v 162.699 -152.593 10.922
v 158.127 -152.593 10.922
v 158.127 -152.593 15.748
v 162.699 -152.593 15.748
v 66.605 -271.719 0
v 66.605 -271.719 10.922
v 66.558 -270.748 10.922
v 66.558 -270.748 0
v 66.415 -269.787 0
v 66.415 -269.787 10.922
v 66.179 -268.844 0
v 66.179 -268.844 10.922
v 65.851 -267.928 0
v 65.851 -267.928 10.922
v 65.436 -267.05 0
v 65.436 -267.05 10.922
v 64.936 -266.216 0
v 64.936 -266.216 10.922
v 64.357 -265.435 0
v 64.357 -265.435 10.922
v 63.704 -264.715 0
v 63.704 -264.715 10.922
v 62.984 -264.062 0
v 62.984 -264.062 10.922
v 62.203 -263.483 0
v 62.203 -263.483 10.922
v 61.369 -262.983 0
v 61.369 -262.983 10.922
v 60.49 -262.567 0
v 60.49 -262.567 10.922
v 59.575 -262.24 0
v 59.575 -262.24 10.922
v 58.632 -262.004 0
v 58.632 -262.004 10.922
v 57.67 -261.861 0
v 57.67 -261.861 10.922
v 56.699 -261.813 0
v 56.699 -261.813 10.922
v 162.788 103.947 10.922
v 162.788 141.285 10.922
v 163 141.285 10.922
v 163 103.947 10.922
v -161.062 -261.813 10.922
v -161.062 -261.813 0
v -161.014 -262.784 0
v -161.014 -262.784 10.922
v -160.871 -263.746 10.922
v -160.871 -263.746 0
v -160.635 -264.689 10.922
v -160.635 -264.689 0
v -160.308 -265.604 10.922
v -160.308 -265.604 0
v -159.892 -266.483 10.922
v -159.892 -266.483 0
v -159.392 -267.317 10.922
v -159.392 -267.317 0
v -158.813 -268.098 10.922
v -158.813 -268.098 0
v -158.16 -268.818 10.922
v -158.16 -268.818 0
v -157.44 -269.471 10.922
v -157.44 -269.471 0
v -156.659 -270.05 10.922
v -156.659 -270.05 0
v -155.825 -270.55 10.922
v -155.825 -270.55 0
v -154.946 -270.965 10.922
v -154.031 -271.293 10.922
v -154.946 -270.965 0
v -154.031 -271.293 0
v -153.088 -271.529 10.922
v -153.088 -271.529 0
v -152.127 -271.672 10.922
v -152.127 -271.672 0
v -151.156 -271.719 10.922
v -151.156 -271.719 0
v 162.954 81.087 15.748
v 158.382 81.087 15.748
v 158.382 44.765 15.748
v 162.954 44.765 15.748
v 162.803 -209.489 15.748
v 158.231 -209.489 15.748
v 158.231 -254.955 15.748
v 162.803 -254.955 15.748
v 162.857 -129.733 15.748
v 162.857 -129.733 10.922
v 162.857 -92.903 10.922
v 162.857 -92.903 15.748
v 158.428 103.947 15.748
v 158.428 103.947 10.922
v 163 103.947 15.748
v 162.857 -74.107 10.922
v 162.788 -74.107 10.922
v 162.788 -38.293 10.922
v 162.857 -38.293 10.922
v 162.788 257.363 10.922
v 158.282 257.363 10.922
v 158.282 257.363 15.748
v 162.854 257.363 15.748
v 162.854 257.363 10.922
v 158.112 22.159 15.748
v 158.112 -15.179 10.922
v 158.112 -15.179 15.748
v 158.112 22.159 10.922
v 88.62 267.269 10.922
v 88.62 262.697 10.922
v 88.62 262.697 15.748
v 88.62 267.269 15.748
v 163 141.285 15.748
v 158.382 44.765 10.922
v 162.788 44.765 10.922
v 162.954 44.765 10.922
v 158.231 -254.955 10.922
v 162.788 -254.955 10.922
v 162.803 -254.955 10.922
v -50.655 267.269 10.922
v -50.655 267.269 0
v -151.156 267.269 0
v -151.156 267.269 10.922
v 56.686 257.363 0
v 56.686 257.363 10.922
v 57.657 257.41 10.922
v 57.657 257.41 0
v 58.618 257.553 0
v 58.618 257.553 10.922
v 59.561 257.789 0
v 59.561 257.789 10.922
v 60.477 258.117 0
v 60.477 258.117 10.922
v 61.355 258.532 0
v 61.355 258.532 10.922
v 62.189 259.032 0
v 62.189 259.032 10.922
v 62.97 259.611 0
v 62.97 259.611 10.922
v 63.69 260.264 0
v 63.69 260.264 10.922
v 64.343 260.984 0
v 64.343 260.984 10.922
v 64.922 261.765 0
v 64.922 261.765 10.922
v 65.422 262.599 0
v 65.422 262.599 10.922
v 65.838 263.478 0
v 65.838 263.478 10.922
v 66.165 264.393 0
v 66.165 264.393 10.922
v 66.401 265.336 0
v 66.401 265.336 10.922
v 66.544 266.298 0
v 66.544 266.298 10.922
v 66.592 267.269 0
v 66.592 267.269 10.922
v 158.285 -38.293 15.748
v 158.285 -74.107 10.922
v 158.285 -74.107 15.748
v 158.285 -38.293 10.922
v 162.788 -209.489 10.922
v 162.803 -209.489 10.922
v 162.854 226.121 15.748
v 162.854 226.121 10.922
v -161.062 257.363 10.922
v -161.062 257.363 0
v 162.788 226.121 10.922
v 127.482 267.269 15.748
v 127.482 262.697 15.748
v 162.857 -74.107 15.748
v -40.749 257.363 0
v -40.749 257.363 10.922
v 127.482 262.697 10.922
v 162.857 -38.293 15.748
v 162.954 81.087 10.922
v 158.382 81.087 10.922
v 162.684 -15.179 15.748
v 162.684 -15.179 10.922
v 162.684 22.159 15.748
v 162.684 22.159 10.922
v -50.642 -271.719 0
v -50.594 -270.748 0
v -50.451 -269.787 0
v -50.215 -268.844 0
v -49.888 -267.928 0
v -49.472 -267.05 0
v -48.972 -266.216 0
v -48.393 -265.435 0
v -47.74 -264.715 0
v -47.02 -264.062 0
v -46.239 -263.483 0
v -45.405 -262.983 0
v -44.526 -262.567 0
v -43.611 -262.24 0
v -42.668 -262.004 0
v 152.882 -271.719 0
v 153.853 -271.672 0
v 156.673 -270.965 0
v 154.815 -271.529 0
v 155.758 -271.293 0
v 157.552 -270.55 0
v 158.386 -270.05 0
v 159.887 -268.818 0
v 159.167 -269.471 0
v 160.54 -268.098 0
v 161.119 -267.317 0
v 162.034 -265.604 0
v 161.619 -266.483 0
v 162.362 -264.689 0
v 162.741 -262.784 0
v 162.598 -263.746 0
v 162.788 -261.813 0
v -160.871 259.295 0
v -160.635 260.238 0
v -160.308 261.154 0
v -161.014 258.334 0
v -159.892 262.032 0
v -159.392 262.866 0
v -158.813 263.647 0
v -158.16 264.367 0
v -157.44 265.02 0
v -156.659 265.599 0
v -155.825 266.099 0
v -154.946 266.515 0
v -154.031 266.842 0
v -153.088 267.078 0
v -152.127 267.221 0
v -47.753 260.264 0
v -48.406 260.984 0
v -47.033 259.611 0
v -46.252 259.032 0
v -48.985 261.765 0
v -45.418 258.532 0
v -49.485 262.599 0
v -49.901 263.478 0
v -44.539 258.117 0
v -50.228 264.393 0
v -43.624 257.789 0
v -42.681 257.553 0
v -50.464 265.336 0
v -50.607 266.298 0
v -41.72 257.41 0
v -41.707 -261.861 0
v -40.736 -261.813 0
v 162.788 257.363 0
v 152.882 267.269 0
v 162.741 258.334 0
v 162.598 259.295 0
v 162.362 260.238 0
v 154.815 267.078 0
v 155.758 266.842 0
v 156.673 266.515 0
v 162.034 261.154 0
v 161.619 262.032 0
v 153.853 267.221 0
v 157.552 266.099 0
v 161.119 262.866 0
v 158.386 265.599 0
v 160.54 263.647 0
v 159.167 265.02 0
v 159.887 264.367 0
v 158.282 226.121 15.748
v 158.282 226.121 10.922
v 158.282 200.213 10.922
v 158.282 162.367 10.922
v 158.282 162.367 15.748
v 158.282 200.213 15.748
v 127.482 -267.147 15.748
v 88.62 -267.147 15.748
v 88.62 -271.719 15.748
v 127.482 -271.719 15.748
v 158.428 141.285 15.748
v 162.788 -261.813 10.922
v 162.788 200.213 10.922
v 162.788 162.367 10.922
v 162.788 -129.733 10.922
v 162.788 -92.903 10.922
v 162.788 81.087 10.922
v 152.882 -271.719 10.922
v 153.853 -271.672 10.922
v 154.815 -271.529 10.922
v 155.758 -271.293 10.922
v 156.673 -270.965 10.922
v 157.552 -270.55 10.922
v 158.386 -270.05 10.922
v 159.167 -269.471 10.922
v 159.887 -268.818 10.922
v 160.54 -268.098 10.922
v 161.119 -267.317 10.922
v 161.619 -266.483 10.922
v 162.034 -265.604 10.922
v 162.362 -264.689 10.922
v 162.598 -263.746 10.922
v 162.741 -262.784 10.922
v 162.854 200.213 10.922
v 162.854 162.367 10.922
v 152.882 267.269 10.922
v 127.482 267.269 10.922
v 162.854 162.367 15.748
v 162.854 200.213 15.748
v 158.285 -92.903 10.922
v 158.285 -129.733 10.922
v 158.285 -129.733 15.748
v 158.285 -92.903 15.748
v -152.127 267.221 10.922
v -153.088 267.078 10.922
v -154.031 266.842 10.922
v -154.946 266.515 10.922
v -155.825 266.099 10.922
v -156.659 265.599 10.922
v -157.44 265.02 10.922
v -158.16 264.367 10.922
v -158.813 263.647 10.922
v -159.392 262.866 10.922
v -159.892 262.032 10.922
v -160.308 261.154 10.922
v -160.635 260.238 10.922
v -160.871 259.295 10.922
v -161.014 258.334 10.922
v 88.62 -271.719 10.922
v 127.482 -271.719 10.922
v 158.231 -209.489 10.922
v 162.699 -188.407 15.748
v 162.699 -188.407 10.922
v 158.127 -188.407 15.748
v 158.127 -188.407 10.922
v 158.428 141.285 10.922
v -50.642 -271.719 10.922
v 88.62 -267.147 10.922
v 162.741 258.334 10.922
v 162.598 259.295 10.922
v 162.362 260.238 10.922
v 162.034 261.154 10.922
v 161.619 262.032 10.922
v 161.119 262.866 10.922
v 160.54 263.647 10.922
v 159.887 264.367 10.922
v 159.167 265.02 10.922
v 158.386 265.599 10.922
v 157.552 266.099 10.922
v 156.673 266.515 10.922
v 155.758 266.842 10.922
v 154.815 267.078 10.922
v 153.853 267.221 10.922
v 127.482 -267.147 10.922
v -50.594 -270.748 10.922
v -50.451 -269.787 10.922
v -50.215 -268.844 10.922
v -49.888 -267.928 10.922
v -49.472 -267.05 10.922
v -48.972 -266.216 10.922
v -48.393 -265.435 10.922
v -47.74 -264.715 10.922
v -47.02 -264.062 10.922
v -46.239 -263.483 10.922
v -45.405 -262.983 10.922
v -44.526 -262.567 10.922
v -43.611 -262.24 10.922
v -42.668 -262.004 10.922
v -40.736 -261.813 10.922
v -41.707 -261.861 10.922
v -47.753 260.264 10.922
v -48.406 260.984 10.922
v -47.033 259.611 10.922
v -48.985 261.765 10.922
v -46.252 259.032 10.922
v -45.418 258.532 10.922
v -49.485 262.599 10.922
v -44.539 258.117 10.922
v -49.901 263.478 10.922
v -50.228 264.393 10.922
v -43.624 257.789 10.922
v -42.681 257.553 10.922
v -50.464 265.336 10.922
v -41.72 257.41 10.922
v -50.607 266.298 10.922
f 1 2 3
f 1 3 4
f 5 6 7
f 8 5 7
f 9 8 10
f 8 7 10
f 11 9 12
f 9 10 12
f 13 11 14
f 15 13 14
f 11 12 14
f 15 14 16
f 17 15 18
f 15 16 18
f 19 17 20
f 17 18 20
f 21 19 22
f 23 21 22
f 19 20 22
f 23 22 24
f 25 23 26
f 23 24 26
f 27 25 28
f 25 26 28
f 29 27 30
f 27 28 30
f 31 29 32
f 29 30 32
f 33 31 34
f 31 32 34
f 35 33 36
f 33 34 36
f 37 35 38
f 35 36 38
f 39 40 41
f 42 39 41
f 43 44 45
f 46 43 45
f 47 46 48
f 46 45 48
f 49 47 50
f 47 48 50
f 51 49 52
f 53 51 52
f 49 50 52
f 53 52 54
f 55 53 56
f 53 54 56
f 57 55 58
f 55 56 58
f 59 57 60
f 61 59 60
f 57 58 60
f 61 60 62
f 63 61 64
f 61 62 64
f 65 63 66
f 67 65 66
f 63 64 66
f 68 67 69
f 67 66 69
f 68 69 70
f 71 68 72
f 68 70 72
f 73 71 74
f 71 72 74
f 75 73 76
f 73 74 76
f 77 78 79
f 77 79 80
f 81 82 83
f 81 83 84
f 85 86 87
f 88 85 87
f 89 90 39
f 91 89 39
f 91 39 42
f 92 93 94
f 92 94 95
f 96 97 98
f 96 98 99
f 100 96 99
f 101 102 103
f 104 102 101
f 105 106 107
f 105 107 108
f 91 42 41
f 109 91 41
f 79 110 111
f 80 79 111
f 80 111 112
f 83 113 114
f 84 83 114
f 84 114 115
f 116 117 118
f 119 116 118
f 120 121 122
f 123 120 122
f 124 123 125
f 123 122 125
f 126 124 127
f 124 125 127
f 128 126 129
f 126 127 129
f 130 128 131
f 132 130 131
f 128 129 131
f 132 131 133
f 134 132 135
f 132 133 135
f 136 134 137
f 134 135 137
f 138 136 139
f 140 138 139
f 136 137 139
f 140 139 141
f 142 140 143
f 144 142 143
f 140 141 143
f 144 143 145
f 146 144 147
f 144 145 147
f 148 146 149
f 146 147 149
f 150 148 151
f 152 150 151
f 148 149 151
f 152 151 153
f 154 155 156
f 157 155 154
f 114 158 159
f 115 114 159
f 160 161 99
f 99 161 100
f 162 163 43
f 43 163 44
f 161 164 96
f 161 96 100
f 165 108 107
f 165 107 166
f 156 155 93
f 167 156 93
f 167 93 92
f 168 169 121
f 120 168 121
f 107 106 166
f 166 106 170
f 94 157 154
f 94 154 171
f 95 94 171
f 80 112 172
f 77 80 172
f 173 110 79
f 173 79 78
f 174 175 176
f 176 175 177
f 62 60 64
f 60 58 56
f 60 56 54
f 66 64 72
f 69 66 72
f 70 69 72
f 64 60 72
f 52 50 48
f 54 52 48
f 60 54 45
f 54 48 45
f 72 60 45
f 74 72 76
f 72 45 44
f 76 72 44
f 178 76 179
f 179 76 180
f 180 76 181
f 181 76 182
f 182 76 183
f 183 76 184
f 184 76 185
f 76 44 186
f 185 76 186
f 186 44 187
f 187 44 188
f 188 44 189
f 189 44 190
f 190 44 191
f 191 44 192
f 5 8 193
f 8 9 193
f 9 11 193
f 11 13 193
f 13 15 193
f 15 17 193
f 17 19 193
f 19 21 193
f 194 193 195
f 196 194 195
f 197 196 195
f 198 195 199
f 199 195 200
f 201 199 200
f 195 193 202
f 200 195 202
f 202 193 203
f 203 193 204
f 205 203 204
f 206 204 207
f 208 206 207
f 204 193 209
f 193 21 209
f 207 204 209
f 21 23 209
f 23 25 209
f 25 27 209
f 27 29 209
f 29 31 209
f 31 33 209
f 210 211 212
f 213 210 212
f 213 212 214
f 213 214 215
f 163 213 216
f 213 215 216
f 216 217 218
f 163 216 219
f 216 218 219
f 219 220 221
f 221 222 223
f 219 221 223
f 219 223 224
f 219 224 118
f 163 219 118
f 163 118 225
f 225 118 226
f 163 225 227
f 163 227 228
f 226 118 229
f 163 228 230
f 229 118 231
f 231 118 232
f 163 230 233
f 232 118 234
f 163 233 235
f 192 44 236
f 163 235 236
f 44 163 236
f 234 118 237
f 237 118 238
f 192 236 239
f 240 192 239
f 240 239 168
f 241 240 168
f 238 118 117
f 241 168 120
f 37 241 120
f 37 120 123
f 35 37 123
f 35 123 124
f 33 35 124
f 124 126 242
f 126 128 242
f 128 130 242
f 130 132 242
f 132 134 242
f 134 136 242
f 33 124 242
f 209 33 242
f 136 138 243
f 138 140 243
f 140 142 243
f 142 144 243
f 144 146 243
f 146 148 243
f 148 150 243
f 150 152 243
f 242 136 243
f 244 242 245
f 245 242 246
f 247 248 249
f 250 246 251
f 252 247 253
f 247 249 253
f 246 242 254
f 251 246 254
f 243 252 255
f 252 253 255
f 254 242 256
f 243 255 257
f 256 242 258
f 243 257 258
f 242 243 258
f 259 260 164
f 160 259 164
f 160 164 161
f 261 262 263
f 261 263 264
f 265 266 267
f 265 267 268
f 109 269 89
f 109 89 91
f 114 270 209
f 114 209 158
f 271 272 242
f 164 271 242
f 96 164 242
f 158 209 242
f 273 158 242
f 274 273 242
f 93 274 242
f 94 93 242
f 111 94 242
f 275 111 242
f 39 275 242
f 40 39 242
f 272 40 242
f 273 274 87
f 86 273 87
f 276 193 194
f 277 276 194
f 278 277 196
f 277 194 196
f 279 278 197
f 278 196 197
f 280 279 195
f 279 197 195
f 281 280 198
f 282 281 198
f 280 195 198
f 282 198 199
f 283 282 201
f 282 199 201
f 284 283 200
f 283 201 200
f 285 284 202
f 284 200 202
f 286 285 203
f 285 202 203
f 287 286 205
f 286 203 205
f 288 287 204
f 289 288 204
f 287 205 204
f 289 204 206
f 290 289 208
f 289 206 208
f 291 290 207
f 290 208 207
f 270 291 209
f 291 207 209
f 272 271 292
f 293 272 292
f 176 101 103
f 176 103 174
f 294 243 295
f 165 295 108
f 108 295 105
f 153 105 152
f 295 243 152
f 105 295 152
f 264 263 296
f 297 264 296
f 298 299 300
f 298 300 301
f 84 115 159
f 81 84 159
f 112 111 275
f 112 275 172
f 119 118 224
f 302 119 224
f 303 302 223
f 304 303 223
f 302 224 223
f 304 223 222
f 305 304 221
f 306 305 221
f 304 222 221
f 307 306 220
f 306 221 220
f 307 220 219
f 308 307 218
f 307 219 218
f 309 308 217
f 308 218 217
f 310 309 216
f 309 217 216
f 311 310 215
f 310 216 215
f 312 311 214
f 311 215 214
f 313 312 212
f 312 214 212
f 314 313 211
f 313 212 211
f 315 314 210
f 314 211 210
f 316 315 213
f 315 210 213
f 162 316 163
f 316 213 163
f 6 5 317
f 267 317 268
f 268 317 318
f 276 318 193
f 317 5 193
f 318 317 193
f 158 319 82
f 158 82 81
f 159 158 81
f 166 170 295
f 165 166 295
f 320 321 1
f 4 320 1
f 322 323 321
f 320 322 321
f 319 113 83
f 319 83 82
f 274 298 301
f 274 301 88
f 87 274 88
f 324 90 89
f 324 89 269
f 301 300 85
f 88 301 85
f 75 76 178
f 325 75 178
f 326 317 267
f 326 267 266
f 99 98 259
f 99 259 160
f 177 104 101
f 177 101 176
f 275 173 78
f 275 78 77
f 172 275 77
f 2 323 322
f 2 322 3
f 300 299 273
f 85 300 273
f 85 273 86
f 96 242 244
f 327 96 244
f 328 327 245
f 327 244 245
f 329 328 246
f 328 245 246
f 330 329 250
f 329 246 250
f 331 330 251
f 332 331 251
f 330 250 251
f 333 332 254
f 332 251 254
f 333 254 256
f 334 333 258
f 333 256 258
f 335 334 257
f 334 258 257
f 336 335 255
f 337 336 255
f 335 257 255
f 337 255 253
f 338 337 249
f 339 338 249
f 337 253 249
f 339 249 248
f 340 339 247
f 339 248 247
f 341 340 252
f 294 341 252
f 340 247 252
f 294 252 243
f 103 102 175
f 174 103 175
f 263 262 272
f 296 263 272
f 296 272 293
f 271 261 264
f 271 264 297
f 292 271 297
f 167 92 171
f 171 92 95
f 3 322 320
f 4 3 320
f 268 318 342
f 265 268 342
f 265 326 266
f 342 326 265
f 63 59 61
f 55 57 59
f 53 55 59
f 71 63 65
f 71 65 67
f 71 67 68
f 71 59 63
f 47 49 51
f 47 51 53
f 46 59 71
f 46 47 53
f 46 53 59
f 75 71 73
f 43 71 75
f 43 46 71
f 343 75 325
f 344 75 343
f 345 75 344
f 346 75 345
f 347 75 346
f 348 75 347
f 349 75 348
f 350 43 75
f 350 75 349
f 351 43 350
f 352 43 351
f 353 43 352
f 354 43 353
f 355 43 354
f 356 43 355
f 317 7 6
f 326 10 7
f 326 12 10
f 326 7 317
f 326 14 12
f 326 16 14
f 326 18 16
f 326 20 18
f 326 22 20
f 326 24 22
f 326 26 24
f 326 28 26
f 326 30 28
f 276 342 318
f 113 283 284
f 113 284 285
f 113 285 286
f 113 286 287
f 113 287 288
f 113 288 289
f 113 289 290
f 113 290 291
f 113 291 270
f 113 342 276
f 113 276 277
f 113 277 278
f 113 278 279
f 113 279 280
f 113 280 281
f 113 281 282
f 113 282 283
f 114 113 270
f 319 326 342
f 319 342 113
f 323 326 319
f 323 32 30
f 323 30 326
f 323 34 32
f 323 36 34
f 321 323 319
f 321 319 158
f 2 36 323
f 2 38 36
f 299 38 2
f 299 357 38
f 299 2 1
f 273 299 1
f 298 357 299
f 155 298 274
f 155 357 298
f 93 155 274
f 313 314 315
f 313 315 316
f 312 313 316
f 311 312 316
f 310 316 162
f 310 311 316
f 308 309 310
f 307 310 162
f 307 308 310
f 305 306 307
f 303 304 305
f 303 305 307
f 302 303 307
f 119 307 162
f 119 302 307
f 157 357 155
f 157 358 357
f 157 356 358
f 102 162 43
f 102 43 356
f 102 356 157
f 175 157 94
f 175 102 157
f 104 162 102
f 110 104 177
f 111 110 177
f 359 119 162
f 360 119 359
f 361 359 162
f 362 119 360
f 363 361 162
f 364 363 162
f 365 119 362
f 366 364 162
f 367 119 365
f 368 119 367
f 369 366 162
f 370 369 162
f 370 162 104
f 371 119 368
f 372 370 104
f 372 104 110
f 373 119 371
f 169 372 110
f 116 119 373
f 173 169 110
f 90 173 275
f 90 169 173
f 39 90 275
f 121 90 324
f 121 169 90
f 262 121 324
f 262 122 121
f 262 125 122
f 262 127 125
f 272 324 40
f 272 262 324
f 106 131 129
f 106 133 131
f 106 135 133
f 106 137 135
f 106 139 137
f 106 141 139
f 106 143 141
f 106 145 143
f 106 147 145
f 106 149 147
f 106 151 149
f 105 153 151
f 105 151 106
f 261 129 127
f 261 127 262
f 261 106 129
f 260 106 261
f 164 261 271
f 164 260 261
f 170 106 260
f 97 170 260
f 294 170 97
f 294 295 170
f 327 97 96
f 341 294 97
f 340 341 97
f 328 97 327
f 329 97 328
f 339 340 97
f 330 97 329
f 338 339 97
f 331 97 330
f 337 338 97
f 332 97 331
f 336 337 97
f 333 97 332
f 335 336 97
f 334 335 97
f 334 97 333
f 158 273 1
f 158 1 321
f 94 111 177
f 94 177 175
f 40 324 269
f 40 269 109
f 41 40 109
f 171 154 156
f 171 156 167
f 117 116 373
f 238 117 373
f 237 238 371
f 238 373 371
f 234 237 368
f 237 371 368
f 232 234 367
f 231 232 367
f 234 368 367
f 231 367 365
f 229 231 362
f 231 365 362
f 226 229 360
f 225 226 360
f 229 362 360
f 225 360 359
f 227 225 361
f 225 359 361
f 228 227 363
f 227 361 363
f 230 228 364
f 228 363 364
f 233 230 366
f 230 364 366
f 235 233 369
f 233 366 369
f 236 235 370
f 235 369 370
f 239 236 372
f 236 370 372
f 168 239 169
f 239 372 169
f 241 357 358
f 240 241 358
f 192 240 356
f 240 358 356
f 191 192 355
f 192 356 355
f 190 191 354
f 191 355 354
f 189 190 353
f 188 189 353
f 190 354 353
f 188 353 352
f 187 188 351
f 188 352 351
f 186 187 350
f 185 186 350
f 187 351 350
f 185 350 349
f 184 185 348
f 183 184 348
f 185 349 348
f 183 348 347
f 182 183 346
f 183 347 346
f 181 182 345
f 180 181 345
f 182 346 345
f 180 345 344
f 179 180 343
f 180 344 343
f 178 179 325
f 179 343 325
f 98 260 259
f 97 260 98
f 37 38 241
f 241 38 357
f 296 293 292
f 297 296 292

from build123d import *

# Parameters (mm, degrees)
F0_W      = 4.572
F0_H      = 45.466
F0_H_2    = 31.242
F0_H_3    = 35.814
F0_H_4    = 37.846
F0_H_5    = 36.83
F0_H_6    = 37.338
F0_H_7    = 36.322
F1_DEPTH  = 10.922
F3_DEPTH  = 10.923
F5_DEPTH  = 10.923
F6_W      = 4.572
F6_H      = 45.466
F7_DEPTH  = 4.826
F8_W      = 4.572
F8_H      = 35.814
F9_DEPTH  = 4.826
F10_W     = 4.572
F10_H     = 36.83
F11_DEPTH = 4.826
F12_W     = 4.572
F12_H     = 35.814
F13_DEPTH = 4.826
F14_W     = 4.572
F14_H     = 37.338
F15_DEPTH = 4.826
F16_W     = 4.572
F16_H     = 36.322
F17_DEPTH = 4.826
F18_W     = 4.572
F18_H     = 37.338
F19_DEPTH = 4.826
F20_W     = 4.572
F20_H     = 37.846
F21_DEPTH = 4.826
F22_W     = 4.572
F22_H     = 31.242
F23_DEPTH = 4.826
F24_W     = 38.862
F24_H     = 4.572
F25_DEPTH = 4.826
F26_W     = 38.862
F26_H     = 4.572
F27_DEPTH = 4.826


with BuildPart() as f1:
    # F0 (on Top) → F1 (new body)
    with BuildSketch(Plane.XY):
        with BuildLine():
            Line((-50.638884, 267.268687), (-151.155582, 267.268687))
            ThreePointArc((-151.155582, 267.268687), (-158.160182, 264.367287), (-161.061582, 257.362687))
            Line((-161.061582, 257.362687), (-161.061582, -261.813313))
            ThreePointArc((-161.061582, -261.813313), (-158.160182, -268.817912), (-151.155582, -271.719313))
            Line((-151.155582, -271.719313), (152.882418, -271.719313))
            ThreePointArc((152.882418, -271.719313), (159.887018, -268.817912), (162.788418, -261.813313))
            Line((162.788418, -261.813313), (162.788418, -254.955313))
            Line((162.788418, -254.955313), (158.216418, -254.955313))
            Line((158.216418, -254.955313), (158.216418, -209.489313))
            Line((158.216418, -209.489313), (162.788418, -209.489313))
            Line((162.788418, -209.489313), (162.788418, -188.407313))
            Line((162.788418, -188.407313), (158.216418, -188.407313))
            Line((158.216418, -188.407313), (158.216418, -152.593313))
            Line((158.216418, -152.593313), (162.788418, -152.593313))
            Line((162.788418, -152.593313), (162.788418, -129.733313))
            Line((162.788418, -129.733313), (158.216418, -129.733313))
            Line((158.216418, -129.733313), (158.216418, -92.903313))
            Line((158.216418, -92.903313), (162.788418, -92.903313))
            Line((162.788418, -92.903313), (162.788418, -74.107313))
            Line((162.788418, -74.107313), (158.216418, -74.107313))
            Line((158.216418, -74.107313), (158.216418, -38.293313))
            Line((158.216418, -38.293313), (162.788418, -38.293313))
            Line((162.788418, -38.293313), (162.788418, -15.179313))
            Line((162.788418, -15.179313), (158.216418, -15.179313))
            Line((158.216418, -15.179313), (158.216418, 22.158687))
            Line((158.216418, 22.158687), (162.788418, 22.158687))
            Line((162.788418, 22.158687), (162.788418, 44.764687))
            Line((162.788418, 44.764687), (158.216418, 44.764687))
            Line((158.216418, 44.764687), (158.216418, 81.086687))
            Line((158.216418, 81.086687), (162.788418, 81.086687))
            Line((162.788418, 81.086687), (162.788418, 103.946687))
            Line((162.788418, 103.946687), (158.216418, 103.946687))
            Line((158.216418, 103.946687), (158.216418, 141.284687))
            Line((158.216418, 141.284687), (162.788418, 141.284687))
            Line((162.788418, 141.284687), (162.788418, 162.366687))
            Line((162.788418, 162.366687), (158.216418, 162.366687))
            Line((158.216418, 162.366687), (158.216418, 200.212687))
            Line((158.216418, 200.212687), (162.788418, 200.212687))
            Line((162.788418, 200.212687), (162.788418, 226.120687))
            Line((162.788418, 226.120687), (158.216418, 226.120687))
            Line((158.216418, 226.120687), (158.216418, 257.362687))
            Line((158.216418, 257.362687), (162.788418, 257.362687))
            ThreePointArc((162.788418, 257.362687), (159.887018, 264.367287), (152.882418, 267.268687))
            Line((152.882418, 267.268687), (66.598618, 267.268687))
            Line((66.598618, 267.268687), (56.692618, 267.268687))
            Line((56.692618, 267.268687), (56.03563, 267.268687))
            Line((56.03563, 267.268687), (-40.811159, 267.268687))
            Line((-40.811159, 267.268687), (-41.249528, 267.268687))
            Line((-41.249528, 267.268687), (-50.638884, 267.268687))
        make_face()
        with Locations((160.502418, -232.222313)):
            Rectangle(F0_W, F0_H)
        with Locations((160.502418, 241.741687)):
            Rectangle(F0_W, F0_H_2)
        with Locations((160.502418, -170.500313)):
            Rectangle(F0_W, F0_H_3)
        with Locations((160.502418, 181.289687)):
            Rectangle(F0_W, F0_H_4)
        with Locations((160.502418, -111.318313)):
            Rectangle(F0_W, F0_H_5)
        with Locations((160.502418, 122.615687)):
            Rectangle(F0_W, F0_H_6)
        with Locations((160.502418, -56.200313)):
            Rectangle(F0_W, F0_H_3)
        with Locations((160.502418, 62.925687)):
            Rectangle(F0_W, F0_H_7)
        with Locations((160.502418, 3.489687)):
            Rectangle(F0_W, F0_H_6)
    extrude(amount=F1_DEPTH)

    # F2 (on face) → F3 (cut, through all)
    with BuildSketch(Plane.XY.offset(10.922)):
        with BuildLine():
            Line((66.59181, 267.268687), (-50.65459, 267.268687))
            ThreePointArc((-50.65459, 267.268687), (-47.75319, 260.264088), (-40.74859, 257.362687))
            Line((-40.74859, 257.362687), (56.68581, 257.362687))
            ThreePointArc((56.68581, 257.362687), (63.69041, 260.264088), (66.59181, 267.268687))
        make_face()
    extrude(amount=-F3_DEPTH, mode=Mode.SUBTRACT)

    # F4 (on face) → F5 (cut, through all)
    with BuildSketch(Plane.XY.offset(10.922)):
        with BuildLine():
            Line((56.699284, -261.813313), (-40.735632, -261.813313))
            ThreePointArc((-40.735632, -261.813313), (-47.740232, -264.714713), (-50.641632, -271.719313))
            Line((-50.641632, -271.719313), (-50.641632, -271.741477))
            Line((-50.641632, -271.741477), (66.605284, -271.741477))
            Line((66.605284, -271.741477), (66.605284, -271.719313))
            ThreePointArc((66.605284, -271.719313), (63.703884, -264.714713), (56.699284, -261.813313))
        make_face()
    extrude(amount=-F5_DEPTH, mode=Mode.SUBTRACT)

    # F6 (on face) → F7 (join)
    with BuildSketch(Plane.XY.offset(10.922)):
        with Locations((160.516776, -232.222313)):
            Rectangle(F6_W, F6_H)
    extrude(amount=F7_DEPTH)

    # F8 (on face) → F9 (join)
    with BuildSketch(Plane.XY.offset(10.922)):
        with Locations((160.412975, -170.500313)):
            Rectangle(F8_W, F8_H)
    extrude(amount=F9_DEPTH)

    # F10 (on face) → F11 (join)
    with BuildSketch(Plane.XY.offset(10.922)):
        with Locations((160.571285, -111.318313)):
            Rectangle(F10_W, F10_H)
    extrude(amount=F11_DEPTH)

    # F12 (on face) → F13 (join)
    with BuildSketch(Plane.XY.offset(10.922)):
        with Locations((160.571292, -56.200313)):
            Rectangle(F12_W, F12_H)
    extrude(amount=F13_DEPTH)

    # F14 (on face) → F15 (join)
    with BuildSketch(Plane.XY.offset(10.922)):
        with Locations((160.397649, 3.489687)):
            Rectangle(F14_W, F14_H)
    extrude(amount=F15_DEPTH)

    # F16 (on face) → F17 (join)
    with BuildSketch(Plane.XY.offset(10.922)):
        with Locations((160.66844, 62.925687)):
            Rectangle(F16_W, F16_H)
    extrude(amount=F17_DEPTH)

    # F18 (on face) → F19 (join)
    with BuildSketch(Plane.XY.offset(10.922)):
        with Locations((160.713606, 122.615687)):
            Rectangle(F18_W, F18_H)
    extrude(amount=F19_DEPTH)

    # F20 (on face) → F21 (join)
    with BuildSketch(Plane.XY.offset(10.922)):
        with Locations((160.567634, 181.289687)):
            Rectangle(F20_W, F20_H)
    extrude(amount=F21_DEPTH)

    # F22 (on face) → F23 (join)
    with BuildSketch(Plane.XY.offset(10.922)):
        with Locations((160.567634, 241.741687)):
            Rectangle(F22_W, F22_H)
    extrude(amount=F23_DEPTH)

    # F24 (on face) → F25 (join)
    with BuildSketch(Plane.XY.offset(10.922)):
        with Locations((108.051418, 264.982687)):
            Rectangle(F24_W, F24_H)
    extrude(amount=F25_DEPTH)

    # F26 (on face) → F27 (join)
    with BuildSketch(Plane.XY.offset(10.922)):
        with Locations((108.051418, -269.433313)):
            Rectangle(F26_W, F26_H)
    extrude(amount=F27_DEPTH)


solid = f1.part
